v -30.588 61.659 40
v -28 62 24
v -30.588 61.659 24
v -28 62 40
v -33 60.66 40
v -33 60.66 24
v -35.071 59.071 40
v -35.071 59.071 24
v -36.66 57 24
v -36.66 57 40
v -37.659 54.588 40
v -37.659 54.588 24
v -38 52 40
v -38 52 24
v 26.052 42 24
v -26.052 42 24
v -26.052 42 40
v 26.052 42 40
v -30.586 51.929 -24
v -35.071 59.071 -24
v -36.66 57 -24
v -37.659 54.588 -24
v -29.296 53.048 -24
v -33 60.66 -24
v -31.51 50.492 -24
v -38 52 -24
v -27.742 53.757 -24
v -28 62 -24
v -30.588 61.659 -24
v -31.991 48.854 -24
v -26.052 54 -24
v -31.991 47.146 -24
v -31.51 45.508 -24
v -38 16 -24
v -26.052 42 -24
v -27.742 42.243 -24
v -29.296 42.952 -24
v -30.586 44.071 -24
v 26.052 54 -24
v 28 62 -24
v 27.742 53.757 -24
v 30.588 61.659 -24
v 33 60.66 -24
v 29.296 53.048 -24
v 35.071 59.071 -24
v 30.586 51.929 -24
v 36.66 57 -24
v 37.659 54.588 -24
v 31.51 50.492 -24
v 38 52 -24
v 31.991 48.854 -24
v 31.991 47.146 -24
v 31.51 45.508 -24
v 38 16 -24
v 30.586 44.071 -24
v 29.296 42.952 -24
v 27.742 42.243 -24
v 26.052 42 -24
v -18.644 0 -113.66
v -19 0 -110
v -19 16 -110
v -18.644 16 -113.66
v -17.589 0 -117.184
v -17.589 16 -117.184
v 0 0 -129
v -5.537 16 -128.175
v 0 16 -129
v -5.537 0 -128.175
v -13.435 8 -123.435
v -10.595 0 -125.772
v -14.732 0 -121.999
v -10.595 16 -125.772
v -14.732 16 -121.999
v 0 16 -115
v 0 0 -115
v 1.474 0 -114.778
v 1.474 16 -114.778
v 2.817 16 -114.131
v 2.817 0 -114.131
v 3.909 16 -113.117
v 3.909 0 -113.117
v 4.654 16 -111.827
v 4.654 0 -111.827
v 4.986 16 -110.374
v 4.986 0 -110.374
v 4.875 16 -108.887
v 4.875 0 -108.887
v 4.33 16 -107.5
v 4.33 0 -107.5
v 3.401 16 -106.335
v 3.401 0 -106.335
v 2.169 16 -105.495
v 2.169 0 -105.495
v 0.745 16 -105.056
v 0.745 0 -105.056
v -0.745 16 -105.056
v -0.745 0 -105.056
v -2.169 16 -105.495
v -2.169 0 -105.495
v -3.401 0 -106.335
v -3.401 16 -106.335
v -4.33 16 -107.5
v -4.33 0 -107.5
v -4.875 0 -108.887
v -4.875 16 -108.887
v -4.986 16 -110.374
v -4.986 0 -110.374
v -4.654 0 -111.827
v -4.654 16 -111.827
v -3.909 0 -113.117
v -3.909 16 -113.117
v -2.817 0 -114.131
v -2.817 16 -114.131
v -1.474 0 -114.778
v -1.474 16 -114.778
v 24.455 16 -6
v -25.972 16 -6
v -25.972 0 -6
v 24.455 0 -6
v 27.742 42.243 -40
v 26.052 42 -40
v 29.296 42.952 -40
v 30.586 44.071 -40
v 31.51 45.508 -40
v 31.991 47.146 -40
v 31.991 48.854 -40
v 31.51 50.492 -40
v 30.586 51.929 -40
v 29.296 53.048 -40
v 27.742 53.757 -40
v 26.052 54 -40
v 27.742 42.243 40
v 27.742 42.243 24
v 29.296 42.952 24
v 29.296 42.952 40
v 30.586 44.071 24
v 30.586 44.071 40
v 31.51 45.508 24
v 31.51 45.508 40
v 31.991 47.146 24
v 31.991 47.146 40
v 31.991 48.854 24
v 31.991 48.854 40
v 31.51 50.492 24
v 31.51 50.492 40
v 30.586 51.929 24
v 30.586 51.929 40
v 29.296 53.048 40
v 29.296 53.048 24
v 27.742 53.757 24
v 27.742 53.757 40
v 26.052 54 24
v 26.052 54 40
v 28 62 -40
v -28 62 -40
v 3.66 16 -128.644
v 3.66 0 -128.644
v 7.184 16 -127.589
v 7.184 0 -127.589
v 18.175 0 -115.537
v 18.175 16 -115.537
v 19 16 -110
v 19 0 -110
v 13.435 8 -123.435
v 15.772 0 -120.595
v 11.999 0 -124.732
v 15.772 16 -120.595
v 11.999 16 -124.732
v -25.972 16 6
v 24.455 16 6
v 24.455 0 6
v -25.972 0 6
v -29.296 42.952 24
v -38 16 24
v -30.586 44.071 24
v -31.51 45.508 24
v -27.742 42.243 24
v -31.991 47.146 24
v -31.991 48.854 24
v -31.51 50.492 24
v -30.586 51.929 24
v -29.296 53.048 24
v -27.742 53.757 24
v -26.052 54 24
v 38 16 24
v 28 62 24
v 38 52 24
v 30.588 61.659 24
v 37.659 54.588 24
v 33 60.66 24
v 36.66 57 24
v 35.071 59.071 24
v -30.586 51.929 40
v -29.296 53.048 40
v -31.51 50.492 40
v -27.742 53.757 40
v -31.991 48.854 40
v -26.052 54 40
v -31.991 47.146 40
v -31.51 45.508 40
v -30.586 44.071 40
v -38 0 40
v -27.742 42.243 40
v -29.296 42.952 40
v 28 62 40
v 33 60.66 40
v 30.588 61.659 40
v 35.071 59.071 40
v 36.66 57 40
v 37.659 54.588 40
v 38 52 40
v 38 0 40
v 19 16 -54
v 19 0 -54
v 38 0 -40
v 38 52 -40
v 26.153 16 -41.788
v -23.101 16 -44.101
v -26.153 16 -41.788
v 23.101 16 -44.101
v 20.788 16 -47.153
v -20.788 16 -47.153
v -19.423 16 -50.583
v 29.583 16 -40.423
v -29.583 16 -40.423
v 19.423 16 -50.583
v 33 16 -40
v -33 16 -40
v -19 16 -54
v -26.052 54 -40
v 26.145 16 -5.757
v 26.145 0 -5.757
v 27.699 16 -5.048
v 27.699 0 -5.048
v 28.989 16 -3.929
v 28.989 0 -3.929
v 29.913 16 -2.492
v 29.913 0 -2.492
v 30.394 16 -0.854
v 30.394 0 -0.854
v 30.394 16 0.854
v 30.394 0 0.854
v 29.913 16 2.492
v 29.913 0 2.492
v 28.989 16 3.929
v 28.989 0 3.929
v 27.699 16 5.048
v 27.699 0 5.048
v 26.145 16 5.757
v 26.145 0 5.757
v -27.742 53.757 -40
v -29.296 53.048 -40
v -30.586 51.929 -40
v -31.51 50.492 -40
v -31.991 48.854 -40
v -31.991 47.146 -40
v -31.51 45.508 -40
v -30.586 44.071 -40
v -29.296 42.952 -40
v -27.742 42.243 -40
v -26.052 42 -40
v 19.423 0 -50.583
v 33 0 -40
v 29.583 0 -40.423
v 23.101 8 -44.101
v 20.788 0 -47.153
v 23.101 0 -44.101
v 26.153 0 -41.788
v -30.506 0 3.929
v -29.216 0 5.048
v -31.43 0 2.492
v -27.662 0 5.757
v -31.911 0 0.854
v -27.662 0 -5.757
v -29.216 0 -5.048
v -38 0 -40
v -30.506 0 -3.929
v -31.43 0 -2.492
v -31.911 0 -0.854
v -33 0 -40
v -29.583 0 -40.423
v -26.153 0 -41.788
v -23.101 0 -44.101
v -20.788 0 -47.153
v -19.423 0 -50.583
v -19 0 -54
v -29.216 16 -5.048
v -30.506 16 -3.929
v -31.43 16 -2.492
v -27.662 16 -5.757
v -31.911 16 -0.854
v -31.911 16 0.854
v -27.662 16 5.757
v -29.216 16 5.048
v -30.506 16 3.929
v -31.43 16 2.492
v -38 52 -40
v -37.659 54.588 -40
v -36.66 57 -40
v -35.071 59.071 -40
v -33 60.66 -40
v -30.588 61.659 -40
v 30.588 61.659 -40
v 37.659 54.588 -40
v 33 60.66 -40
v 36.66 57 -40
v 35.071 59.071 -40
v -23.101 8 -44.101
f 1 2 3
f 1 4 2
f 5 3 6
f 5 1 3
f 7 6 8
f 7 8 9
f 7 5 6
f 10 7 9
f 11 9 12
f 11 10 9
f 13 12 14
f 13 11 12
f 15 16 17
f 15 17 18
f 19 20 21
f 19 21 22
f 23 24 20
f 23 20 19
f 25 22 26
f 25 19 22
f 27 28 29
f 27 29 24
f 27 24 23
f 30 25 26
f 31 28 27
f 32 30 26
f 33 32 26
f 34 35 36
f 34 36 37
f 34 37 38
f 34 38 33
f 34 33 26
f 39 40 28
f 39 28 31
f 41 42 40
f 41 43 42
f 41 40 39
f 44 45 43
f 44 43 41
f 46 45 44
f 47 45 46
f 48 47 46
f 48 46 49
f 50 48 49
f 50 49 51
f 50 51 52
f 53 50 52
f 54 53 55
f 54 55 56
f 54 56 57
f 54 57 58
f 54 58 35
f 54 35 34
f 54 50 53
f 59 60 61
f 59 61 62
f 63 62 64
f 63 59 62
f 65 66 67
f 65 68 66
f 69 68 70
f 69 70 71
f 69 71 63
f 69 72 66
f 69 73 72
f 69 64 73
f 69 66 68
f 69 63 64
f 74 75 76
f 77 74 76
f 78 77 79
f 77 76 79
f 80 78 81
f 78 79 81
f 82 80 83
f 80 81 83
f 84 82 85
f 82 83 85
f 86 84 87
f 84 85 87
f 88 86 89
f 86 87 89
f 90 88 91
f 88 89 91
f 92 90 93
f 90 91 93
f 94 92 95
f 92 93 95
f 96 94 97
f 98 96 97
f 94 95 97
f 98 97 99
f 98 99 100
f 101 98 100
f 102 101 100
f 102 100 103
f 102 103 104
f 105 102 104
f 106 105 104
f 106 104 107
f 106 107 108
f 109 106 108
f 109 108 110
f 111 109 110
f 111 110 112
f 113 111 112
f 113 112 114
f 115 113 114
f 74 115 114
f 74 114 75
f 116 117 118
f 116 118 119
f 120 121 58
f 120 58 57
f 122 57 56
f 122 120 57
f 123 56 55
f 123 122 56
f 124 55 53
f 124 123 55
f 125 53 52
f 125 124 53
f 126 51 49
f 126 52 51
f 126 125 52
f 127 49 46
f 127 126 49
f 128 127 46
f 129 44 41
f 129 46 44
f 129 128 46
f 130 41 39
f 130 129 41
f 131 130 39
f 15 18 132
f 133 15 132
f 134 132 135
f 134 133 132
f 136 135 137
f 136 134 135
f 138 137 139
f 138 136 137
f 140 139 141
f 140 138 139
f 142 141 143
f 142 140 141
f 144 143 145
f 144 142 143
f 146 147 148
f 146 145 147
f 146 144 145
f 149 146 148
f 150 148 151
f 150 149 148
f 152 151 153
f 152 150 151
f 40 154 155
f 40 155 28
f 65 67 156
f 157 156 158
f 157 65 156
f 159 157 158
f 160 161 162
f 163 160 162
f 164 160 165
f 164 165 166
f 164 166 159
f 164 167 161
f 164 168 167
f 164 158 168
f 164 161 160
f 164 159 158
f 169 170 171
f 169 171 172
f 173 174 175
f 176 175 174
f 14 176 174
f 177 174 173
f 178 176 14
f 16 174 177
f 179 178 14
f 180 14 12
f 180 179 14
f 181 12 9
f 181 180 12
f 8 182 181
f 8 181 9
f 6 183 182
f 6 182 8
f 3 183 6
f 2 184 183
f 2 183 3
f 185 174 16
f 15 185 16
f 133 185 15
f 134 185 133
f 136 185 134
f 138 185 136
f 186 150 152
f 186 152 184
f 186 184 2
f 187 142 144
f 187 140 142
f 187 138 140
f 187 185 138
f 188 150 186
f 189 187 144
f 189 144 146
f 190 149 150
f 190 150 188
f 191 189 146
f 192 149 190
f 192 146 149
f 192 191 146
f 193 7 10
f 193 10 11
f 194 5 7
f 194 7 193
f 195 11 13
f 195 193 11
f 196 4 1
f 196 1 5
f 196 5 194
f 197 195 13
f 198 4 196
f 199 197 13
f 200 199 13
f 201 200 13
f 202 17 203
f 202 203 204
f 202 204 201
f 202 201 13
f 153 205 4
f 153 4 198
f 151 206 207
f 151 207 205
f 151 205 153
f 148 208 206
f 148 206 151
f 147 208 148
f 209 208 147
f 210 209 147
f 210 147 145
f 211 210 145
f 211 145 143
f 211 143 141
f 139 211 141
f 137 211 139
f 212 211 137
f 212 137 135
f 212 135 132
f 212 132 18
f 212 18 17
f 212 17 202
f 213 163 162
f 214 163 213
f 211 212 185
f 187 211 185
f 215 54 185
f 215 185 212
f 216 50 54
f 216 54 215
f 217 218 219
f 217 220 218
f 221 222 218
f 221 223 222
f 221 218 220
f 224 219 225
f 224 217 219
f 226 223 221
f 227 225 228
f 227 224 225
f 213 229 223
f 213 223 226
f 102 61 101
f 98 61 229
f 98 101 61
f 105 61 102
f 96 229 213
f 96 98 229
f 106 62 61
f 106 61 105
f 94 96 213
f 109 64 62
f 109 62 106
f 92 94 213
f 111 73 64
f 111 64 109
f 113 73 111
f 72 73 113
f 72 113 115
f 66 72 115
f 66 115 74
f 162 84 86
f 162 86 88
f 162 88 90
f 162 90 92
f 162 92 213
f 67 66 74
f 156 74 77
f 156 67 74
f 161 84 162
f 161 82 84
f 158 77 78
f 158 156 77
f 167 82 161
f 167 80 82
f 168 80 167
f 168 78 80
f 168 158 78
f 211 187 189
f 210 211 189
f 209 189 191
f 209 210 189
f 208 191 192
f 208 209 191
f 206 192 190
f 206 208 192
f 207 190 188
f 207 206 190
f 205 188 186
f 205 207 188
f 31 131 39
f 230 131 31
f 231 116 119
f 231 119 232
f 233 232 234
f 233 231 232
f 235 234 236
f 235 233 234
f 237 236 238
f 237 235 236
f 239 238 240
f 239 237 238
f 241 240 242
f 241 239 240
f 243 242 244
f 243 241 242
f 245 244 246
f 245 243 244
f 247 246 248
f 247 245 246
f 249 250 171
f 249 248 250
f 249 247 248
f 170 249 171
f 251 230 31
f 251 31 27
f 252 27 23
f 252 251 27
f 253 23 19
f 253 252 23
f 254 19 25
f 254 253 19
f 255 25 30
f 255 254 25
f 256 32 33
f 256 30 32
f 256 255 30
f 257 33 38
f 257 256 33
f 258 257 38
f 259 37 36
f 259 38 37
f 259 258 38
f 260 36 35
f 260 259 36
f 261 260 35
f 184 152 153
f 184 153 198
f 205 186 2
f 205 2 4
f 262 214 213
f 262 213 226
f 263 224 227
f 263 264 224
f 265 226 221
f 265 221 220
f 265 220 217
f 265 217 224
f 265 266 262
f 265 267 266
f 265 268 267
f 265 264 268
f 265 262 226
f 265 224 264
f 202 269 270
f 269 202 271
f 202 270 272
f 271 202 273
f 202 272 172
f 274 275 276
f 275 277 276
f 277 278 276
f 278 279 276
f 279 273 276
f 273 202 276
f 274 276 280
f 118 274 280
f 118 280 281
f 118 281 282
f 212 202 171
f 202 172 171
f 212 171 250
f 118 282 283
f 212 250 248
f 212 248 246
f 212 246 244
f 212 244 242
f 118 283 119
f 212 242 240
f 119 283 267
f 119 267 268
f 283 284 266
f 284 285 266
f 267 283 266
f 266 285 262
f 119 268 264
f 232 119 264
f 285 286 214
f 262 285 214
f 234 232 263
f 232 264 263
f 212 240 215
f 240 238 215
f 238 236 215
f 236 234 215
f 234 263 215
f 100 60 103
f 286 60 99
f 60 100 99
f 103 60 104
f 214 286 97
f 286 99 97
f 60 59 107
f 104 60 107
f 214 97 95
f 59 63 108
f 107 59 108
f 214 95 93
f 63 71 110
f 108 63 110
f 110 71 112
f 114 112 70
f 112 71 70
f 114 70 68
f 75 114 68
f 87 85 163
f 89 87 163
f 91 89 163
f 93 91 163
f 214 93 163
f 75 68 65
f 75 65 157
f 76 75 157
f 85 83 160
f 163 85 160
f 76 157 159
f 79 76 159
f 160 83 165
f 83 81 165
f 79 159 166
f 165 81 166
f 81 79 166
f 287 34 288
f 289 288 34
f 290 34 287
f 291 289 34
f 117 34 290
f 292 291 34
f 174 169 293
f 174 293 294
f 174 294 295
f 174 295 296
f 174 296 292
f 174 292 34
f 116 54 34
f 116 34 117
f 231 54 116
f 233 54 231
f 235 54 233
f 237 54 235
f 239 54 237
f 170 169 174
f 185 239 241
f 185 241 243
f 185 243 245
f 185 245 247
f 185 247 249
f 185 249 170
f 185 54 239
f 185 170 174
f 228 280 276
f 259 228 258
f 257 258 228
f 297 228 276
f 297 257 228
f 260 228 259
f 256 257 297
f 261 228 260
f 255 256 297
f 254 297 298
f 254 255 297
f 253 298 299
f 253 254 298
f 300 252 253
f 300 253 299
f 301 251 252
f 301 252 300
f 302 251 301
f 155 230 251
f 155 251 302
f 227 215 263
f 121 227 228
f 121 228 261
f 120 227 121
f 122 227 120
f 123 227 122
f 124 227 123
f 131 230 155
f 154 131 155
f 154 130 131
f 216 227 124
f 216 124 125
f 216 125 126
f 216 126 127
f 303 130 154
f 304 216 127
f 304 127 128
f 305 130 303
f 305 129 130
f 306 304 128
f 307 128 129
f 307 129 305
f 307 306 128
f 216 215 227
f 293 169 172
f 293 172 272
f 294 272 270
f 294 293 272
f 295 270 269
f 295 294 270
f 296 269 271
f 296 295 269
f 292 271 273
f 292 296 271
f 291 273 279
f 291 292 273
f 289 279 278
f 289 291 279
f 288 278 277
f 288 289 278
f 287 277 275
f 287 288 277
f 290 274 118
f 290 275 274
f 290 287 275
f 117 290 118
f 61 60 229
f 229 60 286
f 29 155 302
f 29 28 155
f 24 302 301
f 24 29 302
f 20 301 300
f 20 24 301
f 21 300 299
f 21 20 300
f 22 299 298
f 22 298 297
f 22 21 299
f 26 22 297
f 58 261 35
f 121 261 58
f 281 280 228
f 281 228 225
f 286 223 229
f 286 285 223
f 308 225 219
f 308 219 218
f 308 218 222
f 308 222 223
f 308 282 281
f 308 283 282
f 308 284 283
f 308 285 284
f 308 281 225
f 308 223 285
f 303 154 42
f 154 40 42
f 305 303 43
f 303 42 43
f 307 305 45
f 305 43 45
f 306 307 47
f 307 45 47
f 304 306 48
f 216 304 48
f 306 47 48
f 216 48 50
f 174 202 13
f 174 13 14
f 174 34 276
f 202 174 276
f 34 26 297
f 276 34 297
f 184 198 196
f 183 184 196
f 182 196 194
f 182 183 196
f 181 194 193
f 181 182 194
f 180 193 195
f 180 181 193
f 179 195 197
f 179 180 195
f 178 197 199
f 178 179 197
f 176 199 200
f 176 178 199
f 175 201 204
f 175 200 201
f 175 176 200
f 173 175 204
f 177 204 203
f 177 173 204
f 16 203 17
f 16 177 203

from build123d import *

# Parameters (mm, degrees)
ESTRUSIONE_ESTRUSIONE1_DEPTH = 38
RACCORDO1_R                  = 10
SCHIZZO3_W                   = 38
SCHIZZO3_H                   = 89
ESTRUSIONE_ESTRUSIONE2_DEPTH = 16
RACCORDO3_START              = -1
RACCORDO3_DEPTH              = 18
RACCORDO4_DEPTH              = 16
FORO_10_0_10_1_D             = 10
FORO_10_0_10_1_ON_FACE_2_D   = 10
TAGLIO_ESTRUSIONE1_DEPTH     = 115.93041384
TAGLIO_ESTRUSIONE2_REACH     = 144.13


with BuildPart() as part:
    # Schizzo2 → Estrusione-Estrusione1 (new, symmetric)
    with BuildSketch(Plane(origin=(0, 0, 0), x_dir=(0, 0, -1), z_dir=(1, 0, 0))):
        Polygon((-24, 16), (-24, 62), (-40, 62), (-40, 0), (40, 0), (40, 62), (24, 62), (24, 16), align=None)
    extrude(amount=ESTRUSIONE_ESTRUSIONE1_DEPTH, both=True)

    # Raccordo1
    raccordo1_edges = [part.edges().sort_by_distance(p)[0] for p in [
        (-38, 62, -32),
        (38, 62, -32),
        (38, 62, 32),
        (-38, 62, 32),
    ]]
    fillet(raccordo1_edges, radius=RACCORDO1_R)

    # Schizzo3 → Estrusione-Estrusione2 (add)
    with BuildSketch(Plane.XZ):
        with Locations((0, -84.5)):
            Rectangle(SCHIZZO3_W, SCHIZZO3_H)
    extrude(amount=-ESTRUSIONE_ESTRUSIONE2_DEPTH)

    # Raccordo3: read off the stored shape, not the designer's step
    # Raccordo3 outline → Raccordo3 (cut)
    with BuildSketch(Plane(origin=(0, 0, 0), x_dir=(1, 0, 0), z_dir=(0, 1, 0)).offset(RACCORDO3_START)):
        with BuildLine():
            Line((-19, 129), (-19, 110))
            add(Edge.make_bspline(
                [(-19, 110), (-19, 129), (0, 129)],
                knots=[0, 0, 0, 1, 1, 1], degree=2, weights=[1, 0.707106781, 1]))
            Line((0, 129), (-19, 129))
        make_face()
        with BuildLine():
            Line((19, 129), (0, 129))
            add(Edge.make_bspline(
                [(0, 129), (19, 129), (19, 110)],
                knots=[0, 0, 0, 1, 1, 1], degree=2, weights=[1, 0.707106781, 1]))
            Line((19, 110), (19, 129))
        make_face()
    extrude(amount=RACCORDO3_DEPTH, mode=Mode.SUBTRACT)

    # Raccordo4: read off the stored shape, not the designer's step
    # Raccordo4 outline → Raccordo4 (add)
    with BuildSketch(Plane(origin=(0, 0, 0), x_dir=(1, 0, 0), z_dir=(0, 1, 0))):
        with BuildLine():
            Line((19, 54), (19, 40))
            Line((19, 40), (33, 40))
            add(Edge.make_bspline(
                [(19, 54), (19, 40), (33, 40)],
                knots=[0, 0, 0, 1, 1, 1], degree=2, weights=[1, 0.707106781, 1]))
        make_face()
        with BuildLine():
            add(Edge.make_bspline(
                [(-33, 40), (-19, 40), (-19, 54)],
                knots=[0, 0, 0, 1, 1, 1], degree=2, weights=[1, 0.707106781, 1]))
            Line((-33, 40), (-19, 40))
            Line((-19, 40), (-19, 54))
        make_face()
    extrude(amount=RACCORDO4_DEPTH)

    # Foro Ø10.0 (10)-1 (through all)
    with Locations(Plane(origin=(4.7e-08, 16, -110.000000174), x_dir=(0, 0, 1), z_dir=(0, 1, 0))):
        with Locations((0, 0)):
            Hole(FORO_10_0_10_1_D / 2)

    # Foro Ø10.0 (10)-1 on face 2 (through all)
    with Locations(Plane(origin=(0, 0, -110), x_dir=(0, 0, -1), z_dir=(0, -1, 0))):
        with Locations((0, 0)):
            Hole(FORO_10_0_10_1_ON_FACE_2_D / 2)

    # Schizzo5 → Taglio-Estrusione1 (cut, through all)
    with BuildSketch(Plane(origin=(0, 0, -40), x_dir=(-1, 0, 0), z_dir=(0, 0, -1))):
        with BuildLine():
            Line((-26.051804846, 54), (26.051804846, 54))
            ThreePointArc((26.051804846, 54), (32.051804846, 48), (26.051804846, 42))
            Line((26.051804846, 42), (-26.051804846, 42))
            ThreePointArc((-26.051804846, 42), (-32.051804846, 48), (-26.051804846, 54))
        make_face()
    extrude(amount=-TAGLIO_ESTRUSIONE1_DEPTH, mode=Mode.SUBTRACT)

    # Schizzo6 → Taglio-Estrusione2 (cut, up to next)
    with BuildSketch(Plane(origin=(0, 16, 0), x_dir=(1, 0, 0), z_dir=(0, 1, 0)), mode=Mode.PRIVATE) as taglio_estrusione2_sk1:
        with BuildLine():
            Line((-25.97197238, 6), (24.454717483, 6))
            ThreePointArc((24.454717483, 6), (30.454717483, 0), (24.454717483, -6))
            Line((24.454717483, -6), (-25.97197238, -6))
            ThreePointArc((-25.97197238, -6), (-31.97197238, 0), (-25.97197238, 6))
        make_face()
    taglio_estrusione2_tool1 = extrude(taglio_estrusione2_sk1.sketch, amount=-TAGLIO_ESTRUSIONE2_REACH, mode=Mode.PRIVATE) & part.part
    add(taglio_estrusione2_tool1.solids().sort_by_distance((-0.758627, 16, 0))[0], mode=Mode.SUBTRACT)


solid = part.part
